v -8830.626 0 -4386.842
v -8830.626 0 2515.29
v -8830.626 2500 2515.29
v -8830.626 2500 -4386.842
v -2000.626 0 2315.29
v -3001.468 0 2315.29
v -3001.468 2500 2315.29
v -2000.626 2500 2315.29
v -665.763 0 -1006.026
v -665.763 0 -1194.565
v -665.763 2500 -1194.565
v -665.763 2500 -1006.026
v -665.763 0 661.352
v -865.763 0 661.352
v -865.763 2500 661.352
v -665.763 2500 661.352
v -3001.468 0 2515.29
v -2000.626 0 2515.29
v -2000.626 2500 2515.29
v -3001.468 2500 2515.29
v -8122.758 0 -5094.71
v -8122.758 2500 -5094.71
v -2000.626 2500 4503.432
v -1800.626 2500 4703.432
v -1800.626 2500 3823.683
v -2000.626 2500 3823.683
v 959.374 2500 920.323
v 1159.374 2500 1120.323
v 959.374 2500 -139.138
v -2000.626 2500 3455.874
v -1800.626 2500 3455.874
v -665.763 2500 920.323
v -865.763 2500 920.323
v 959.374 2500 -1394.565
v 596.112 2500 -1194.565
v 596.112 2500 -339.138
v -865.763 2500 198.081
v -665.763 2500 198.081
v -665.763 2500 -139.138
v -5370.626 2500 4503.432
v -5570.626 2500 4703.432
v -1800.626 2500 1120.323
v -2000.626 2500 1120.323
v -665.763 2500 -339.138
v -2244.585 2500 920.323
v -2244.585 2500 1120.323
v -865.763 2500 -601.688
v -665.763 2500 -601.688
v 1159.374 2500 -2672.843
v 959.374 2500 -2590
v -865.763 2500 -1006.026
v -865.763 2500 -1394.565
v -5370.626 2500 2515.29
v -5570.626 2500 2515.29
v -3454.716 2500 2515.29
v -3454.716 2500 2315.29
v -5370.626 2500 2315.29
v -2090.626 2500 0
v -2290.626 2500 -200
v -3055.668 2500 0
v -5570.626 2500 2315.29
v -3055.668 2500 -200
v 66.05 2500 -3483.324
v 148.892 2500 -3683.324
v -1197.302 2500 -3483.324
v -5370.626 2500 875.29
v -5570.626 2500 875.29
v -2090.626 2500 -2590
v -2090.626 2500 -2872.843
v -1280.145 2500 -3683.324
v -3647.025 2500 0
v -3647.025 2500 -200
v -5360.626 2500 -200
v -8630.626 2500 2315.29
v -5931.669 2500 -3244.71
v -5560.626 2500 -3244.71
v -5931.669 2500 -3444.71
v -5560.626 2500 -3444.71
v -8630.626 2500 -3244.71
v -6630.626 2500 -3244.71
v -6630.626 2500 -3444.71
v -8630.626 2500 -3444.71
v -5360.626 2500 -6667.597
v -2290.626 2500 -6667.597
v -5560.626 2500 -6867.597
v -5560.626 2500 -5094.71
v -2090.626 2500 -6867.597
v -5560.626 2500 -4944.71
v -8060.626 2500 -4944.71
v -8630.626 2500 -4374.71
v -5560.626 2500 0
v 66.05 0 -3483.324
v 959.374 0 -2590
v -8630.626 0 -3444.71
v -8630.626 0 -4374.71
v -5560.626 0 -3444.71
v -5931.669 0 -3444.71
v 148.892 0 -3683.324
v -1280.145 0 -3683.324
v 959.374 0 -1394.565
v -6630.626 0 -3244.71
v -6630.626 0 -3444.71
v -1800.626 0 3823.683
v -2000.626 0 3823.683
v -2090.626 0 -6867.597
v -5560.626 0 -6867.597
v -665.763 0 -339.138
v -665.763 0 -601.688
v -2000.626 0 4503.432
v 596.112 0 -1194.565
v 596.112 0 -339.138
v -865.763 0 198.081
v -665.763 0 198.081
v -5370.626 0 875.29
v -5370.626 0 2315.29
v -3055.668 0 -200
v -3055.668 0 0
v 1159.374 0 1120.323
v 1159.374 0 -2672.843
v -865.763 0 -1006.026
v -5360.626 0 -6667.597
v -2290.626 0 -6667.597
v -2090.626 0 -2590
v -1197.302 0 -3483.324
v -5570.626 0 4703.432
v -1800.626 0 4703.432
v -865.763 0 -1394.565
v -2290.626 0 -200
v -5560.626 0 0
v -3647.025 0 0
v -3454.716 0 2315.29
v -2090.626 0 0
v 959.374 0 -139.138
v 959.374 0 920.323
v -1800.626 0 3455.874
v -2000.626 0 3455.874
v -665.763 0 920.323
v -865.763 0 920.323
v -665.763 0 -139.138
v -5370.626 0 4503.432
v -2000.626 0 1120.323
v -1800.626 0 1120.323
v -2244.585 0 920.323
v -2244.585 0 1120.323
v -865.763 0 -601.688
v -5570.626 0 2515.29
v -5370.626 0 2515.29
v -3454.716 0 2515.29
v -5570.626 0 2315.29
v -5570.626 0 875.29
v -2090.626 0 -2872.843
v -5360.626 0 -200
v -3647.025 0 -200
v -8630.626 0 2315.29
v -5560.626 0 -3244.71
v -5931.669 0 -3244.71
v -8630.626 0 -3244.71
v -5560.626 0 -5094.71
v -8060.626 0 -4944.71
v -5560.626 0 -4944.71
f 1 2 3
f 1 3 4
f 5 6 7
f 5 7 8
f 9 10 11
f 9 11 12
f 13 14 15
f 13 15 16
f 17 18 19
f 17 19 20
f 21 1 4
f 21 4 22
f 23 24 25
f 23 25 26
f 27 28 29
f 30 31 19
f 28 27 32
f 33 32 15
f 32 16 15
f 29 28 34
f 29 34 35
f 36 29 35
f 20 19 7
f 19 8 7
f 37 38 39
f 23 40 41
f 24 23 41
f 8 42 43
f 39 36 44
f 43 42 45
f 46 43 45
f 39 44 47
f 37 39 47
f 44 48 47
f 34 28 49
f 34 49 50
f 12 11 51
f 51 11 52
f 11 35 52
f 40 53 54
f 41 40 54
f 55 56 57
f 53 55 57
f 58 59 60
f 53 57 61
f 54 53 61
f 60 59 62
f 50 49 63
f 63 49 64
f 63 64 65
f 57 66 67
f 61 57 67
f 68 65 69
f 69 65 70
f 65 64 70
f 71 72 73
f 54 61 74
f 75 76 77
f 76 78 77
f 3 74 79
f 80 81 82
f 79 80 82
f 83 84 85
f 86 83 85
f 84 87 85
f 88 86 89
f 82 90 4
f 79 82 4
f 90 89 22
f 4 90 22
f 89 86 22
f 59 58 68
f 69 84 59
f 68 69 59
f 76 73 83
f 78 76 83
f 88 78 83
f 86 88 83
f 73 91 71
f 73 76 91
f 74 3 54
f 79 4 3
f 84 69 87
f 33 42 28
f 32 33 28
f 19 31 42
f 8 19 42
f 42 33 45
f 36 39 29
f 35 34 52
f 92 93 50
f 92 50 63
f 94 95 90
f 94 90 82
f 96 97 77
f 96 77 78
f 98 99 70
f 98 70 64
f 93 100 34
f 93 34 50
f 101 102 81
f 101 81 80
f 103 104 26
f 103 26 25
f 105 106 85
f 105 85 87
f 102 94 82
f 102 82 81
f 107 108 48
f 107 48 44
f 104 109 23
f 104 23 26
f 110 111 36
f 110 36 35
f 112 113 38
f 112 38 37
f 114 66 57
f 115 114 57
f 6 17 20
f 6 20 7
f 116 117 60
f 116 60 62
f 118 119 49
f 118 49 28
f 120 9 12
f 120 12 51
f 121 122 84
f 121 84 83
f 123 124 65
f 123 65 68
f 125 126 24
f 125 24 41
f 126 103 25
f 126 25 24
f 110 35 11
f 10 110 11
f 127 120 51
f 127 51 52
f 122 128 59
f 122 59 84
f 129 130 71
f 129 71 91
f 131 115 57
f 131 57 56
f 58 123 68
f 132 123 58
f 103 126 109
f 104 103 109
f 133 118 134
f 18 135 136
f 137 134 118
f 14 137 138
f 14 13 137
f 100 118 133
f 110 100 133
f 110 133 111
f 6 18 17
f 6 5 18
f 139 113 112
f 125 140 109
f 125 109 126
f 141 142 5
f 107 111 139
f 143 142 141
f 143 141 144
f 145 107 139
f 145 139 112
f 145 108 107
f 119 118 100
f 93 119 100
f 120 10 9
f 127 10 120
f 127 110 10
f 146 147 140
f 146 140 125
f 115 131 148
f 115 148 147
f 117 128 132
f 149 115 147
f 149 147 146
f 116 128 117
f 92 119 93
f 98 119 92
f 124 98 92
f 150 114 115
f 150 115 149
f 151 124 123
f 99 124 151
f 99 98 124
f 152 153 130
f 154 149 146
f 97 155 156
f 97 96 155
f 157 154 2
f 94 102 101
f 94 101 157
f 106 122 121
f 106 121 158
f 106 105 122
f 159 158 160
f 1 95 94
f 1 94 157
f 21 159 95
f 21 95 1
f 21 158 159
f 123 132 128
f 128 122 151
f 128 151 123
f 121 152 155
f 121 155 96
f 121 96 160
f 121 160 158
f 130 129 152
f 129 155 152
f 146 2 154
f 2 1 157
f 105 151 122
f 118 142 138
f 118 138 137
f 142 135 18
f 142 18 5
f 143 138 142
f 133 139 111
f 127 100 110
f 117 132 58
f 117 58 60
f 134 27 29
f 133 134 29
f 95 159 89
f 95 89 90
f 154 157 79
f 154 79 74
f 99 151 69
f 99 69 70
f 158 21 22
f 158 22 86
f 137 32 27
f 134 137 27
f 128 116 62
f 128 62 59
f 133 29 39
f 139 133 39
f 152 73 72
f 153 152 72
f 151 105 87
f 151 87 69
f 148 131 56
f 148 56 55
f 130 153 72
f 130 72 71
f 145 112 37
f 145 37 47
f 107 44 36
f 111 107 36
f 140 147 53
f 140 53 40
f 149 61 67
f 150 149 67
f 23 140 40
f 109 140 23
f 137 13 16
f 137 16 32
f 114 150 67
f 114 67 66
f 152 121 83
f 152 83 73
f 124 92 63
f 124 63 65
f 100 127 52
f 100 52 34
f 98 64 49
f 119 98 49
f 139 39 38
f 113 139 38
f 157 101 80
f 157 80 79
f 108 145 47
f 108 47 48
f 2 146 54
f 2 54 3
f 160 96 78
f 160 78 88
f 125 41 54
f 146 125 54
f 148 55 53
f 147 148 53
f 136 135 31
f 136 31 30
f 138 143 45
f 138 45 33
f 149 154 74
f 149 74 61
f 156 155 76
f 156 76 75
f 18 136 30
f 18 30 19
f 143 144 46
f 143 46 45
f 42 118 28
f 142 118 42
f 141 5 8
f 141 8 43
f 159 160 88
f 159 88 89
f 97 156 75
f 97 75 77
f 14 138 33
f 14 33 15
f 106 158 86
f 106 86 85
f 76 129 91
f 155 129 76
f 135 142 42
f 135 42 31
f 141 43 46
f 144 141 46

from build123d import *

# Parameters (mm, degrees)
BOSS_EXTRUDE1_DEPTH = 2500


with BuildPart() as part:
    # Sketch1 → Boss-Extrude1 (new body)
    with BuildSketch(Plane(origin=(0, 0, 0), x_dir=(1, 0, 0), z_dir=(0, 1, 0))):
        Polygon((959.373842867, 1394.56463349), (959.373842867, 2590), (66.049525486, 3483.324317381), (-1197.301839752, 3483.324317381), (-2090.626157133, 2590), (-2090.626157133, 0), (-3055.667562724, 0), (-3055.667562724, 200), (-2290.626157133, 200), (-2290.626157133, 6667.596809264), (-5360.626157133, 6667.596809264), (-5360.626157133, 200), (-3647.025316722, 200), (-3647.025316722, 0), (-5560.626157133, 0), (-5560.626157133, 3244.709781271), (-5931.668920541, 3244.709781271), (-5931.668920541, 3444.709781271), (-5560.626157133, 3444.709781271), (-5560.626157133, 4944.709781271), (-8060.626157133, 4944.709781271), (-8630.626157133, 4374.709781271), (-8630.626157133, 3444.709781271), (-6630.626157133, 3444.709781271), (-6630.626157133, 3244.709781271), (-8630.626157133, 3244.709781271), (-8630.626157133, -2315.290218729), (-5570.626157133, -2315.290218729), (-5570.626157133, -875.290218729), (-5370.626157133, -875.290218729), (-5370.626157133, -2315.290218729), (-3454.716376336, -2315.290218729), (-3454.716376336, -2515.290218729), (-5370.626157133, -2515.290218729), (-5370.626157133, -4503.431868327), (-2000.626157133, -4503.431868327), (-2000.626157133, -3823.682857884), (-1800.626157133, -3823.682857884), (-1800.626157133, -4703.431868327), (-5570.626157133, -4703.431868327), (-5570.626157133, -2515.290218729), (-8830.626157133, -2515.290218729), (-8830.626157133, 4386.841815627), (-8122.758191489, 5094.709781271), (-5560.626157133, 5094.709781271), (-5560.626157133, 6867.596809264), (-2090.626157133, 6867.596809264), (-2090.626157133, 2872.842712475), (-1280.144552227, 3683.324317381), (148.89223796, 3683.324317381), (1159.373842867, 2672.842712475), (1159.373842867, -1120.323035623), (-1800.626157133, -1120.323035623), (-1800.626157133, -3455.874270038), (-2000.626157133, -3455.874270038), (-2000.626157133, -2515.290218729), (-3001.468171969, -2515.290218729), (-3001.468171969, -2315.290218729), (-2000.626157133, -2315.290218729), (-2000.626157133, -1120.323035623), (-2244.585344705, -1120.323035623), (-2244.585344705, -920.323035623), (-865.76253991, -920.323035623), (-865.76253991, -661.352497341), (-665.76253991, -661.352497341), (-665.76253991, -920.323035623), (959.373842867, -920.323035623), (959.373842867, 139.138374563), (-665.76253991, 139.138374563), (-665.76253991, -198.081222703), (-865.76253991, -198.081222703), (-865.76253991, 601.688140889), (-665.76253991, 601.688140889), (-665.76253991, 339.138374563), (596.112266743, 339.138374563), (596.112266743, 1194.56463349), (-665.76253991, 1194.56463349), (-665.76253991, 1006.025679399), (-865.76253991, 1006.025679399), (-865.76253991, 1394.56463349), align=None)
    extrude(amount=BOSS_EXTRUDE1_DEPTH)


solid = part.part
